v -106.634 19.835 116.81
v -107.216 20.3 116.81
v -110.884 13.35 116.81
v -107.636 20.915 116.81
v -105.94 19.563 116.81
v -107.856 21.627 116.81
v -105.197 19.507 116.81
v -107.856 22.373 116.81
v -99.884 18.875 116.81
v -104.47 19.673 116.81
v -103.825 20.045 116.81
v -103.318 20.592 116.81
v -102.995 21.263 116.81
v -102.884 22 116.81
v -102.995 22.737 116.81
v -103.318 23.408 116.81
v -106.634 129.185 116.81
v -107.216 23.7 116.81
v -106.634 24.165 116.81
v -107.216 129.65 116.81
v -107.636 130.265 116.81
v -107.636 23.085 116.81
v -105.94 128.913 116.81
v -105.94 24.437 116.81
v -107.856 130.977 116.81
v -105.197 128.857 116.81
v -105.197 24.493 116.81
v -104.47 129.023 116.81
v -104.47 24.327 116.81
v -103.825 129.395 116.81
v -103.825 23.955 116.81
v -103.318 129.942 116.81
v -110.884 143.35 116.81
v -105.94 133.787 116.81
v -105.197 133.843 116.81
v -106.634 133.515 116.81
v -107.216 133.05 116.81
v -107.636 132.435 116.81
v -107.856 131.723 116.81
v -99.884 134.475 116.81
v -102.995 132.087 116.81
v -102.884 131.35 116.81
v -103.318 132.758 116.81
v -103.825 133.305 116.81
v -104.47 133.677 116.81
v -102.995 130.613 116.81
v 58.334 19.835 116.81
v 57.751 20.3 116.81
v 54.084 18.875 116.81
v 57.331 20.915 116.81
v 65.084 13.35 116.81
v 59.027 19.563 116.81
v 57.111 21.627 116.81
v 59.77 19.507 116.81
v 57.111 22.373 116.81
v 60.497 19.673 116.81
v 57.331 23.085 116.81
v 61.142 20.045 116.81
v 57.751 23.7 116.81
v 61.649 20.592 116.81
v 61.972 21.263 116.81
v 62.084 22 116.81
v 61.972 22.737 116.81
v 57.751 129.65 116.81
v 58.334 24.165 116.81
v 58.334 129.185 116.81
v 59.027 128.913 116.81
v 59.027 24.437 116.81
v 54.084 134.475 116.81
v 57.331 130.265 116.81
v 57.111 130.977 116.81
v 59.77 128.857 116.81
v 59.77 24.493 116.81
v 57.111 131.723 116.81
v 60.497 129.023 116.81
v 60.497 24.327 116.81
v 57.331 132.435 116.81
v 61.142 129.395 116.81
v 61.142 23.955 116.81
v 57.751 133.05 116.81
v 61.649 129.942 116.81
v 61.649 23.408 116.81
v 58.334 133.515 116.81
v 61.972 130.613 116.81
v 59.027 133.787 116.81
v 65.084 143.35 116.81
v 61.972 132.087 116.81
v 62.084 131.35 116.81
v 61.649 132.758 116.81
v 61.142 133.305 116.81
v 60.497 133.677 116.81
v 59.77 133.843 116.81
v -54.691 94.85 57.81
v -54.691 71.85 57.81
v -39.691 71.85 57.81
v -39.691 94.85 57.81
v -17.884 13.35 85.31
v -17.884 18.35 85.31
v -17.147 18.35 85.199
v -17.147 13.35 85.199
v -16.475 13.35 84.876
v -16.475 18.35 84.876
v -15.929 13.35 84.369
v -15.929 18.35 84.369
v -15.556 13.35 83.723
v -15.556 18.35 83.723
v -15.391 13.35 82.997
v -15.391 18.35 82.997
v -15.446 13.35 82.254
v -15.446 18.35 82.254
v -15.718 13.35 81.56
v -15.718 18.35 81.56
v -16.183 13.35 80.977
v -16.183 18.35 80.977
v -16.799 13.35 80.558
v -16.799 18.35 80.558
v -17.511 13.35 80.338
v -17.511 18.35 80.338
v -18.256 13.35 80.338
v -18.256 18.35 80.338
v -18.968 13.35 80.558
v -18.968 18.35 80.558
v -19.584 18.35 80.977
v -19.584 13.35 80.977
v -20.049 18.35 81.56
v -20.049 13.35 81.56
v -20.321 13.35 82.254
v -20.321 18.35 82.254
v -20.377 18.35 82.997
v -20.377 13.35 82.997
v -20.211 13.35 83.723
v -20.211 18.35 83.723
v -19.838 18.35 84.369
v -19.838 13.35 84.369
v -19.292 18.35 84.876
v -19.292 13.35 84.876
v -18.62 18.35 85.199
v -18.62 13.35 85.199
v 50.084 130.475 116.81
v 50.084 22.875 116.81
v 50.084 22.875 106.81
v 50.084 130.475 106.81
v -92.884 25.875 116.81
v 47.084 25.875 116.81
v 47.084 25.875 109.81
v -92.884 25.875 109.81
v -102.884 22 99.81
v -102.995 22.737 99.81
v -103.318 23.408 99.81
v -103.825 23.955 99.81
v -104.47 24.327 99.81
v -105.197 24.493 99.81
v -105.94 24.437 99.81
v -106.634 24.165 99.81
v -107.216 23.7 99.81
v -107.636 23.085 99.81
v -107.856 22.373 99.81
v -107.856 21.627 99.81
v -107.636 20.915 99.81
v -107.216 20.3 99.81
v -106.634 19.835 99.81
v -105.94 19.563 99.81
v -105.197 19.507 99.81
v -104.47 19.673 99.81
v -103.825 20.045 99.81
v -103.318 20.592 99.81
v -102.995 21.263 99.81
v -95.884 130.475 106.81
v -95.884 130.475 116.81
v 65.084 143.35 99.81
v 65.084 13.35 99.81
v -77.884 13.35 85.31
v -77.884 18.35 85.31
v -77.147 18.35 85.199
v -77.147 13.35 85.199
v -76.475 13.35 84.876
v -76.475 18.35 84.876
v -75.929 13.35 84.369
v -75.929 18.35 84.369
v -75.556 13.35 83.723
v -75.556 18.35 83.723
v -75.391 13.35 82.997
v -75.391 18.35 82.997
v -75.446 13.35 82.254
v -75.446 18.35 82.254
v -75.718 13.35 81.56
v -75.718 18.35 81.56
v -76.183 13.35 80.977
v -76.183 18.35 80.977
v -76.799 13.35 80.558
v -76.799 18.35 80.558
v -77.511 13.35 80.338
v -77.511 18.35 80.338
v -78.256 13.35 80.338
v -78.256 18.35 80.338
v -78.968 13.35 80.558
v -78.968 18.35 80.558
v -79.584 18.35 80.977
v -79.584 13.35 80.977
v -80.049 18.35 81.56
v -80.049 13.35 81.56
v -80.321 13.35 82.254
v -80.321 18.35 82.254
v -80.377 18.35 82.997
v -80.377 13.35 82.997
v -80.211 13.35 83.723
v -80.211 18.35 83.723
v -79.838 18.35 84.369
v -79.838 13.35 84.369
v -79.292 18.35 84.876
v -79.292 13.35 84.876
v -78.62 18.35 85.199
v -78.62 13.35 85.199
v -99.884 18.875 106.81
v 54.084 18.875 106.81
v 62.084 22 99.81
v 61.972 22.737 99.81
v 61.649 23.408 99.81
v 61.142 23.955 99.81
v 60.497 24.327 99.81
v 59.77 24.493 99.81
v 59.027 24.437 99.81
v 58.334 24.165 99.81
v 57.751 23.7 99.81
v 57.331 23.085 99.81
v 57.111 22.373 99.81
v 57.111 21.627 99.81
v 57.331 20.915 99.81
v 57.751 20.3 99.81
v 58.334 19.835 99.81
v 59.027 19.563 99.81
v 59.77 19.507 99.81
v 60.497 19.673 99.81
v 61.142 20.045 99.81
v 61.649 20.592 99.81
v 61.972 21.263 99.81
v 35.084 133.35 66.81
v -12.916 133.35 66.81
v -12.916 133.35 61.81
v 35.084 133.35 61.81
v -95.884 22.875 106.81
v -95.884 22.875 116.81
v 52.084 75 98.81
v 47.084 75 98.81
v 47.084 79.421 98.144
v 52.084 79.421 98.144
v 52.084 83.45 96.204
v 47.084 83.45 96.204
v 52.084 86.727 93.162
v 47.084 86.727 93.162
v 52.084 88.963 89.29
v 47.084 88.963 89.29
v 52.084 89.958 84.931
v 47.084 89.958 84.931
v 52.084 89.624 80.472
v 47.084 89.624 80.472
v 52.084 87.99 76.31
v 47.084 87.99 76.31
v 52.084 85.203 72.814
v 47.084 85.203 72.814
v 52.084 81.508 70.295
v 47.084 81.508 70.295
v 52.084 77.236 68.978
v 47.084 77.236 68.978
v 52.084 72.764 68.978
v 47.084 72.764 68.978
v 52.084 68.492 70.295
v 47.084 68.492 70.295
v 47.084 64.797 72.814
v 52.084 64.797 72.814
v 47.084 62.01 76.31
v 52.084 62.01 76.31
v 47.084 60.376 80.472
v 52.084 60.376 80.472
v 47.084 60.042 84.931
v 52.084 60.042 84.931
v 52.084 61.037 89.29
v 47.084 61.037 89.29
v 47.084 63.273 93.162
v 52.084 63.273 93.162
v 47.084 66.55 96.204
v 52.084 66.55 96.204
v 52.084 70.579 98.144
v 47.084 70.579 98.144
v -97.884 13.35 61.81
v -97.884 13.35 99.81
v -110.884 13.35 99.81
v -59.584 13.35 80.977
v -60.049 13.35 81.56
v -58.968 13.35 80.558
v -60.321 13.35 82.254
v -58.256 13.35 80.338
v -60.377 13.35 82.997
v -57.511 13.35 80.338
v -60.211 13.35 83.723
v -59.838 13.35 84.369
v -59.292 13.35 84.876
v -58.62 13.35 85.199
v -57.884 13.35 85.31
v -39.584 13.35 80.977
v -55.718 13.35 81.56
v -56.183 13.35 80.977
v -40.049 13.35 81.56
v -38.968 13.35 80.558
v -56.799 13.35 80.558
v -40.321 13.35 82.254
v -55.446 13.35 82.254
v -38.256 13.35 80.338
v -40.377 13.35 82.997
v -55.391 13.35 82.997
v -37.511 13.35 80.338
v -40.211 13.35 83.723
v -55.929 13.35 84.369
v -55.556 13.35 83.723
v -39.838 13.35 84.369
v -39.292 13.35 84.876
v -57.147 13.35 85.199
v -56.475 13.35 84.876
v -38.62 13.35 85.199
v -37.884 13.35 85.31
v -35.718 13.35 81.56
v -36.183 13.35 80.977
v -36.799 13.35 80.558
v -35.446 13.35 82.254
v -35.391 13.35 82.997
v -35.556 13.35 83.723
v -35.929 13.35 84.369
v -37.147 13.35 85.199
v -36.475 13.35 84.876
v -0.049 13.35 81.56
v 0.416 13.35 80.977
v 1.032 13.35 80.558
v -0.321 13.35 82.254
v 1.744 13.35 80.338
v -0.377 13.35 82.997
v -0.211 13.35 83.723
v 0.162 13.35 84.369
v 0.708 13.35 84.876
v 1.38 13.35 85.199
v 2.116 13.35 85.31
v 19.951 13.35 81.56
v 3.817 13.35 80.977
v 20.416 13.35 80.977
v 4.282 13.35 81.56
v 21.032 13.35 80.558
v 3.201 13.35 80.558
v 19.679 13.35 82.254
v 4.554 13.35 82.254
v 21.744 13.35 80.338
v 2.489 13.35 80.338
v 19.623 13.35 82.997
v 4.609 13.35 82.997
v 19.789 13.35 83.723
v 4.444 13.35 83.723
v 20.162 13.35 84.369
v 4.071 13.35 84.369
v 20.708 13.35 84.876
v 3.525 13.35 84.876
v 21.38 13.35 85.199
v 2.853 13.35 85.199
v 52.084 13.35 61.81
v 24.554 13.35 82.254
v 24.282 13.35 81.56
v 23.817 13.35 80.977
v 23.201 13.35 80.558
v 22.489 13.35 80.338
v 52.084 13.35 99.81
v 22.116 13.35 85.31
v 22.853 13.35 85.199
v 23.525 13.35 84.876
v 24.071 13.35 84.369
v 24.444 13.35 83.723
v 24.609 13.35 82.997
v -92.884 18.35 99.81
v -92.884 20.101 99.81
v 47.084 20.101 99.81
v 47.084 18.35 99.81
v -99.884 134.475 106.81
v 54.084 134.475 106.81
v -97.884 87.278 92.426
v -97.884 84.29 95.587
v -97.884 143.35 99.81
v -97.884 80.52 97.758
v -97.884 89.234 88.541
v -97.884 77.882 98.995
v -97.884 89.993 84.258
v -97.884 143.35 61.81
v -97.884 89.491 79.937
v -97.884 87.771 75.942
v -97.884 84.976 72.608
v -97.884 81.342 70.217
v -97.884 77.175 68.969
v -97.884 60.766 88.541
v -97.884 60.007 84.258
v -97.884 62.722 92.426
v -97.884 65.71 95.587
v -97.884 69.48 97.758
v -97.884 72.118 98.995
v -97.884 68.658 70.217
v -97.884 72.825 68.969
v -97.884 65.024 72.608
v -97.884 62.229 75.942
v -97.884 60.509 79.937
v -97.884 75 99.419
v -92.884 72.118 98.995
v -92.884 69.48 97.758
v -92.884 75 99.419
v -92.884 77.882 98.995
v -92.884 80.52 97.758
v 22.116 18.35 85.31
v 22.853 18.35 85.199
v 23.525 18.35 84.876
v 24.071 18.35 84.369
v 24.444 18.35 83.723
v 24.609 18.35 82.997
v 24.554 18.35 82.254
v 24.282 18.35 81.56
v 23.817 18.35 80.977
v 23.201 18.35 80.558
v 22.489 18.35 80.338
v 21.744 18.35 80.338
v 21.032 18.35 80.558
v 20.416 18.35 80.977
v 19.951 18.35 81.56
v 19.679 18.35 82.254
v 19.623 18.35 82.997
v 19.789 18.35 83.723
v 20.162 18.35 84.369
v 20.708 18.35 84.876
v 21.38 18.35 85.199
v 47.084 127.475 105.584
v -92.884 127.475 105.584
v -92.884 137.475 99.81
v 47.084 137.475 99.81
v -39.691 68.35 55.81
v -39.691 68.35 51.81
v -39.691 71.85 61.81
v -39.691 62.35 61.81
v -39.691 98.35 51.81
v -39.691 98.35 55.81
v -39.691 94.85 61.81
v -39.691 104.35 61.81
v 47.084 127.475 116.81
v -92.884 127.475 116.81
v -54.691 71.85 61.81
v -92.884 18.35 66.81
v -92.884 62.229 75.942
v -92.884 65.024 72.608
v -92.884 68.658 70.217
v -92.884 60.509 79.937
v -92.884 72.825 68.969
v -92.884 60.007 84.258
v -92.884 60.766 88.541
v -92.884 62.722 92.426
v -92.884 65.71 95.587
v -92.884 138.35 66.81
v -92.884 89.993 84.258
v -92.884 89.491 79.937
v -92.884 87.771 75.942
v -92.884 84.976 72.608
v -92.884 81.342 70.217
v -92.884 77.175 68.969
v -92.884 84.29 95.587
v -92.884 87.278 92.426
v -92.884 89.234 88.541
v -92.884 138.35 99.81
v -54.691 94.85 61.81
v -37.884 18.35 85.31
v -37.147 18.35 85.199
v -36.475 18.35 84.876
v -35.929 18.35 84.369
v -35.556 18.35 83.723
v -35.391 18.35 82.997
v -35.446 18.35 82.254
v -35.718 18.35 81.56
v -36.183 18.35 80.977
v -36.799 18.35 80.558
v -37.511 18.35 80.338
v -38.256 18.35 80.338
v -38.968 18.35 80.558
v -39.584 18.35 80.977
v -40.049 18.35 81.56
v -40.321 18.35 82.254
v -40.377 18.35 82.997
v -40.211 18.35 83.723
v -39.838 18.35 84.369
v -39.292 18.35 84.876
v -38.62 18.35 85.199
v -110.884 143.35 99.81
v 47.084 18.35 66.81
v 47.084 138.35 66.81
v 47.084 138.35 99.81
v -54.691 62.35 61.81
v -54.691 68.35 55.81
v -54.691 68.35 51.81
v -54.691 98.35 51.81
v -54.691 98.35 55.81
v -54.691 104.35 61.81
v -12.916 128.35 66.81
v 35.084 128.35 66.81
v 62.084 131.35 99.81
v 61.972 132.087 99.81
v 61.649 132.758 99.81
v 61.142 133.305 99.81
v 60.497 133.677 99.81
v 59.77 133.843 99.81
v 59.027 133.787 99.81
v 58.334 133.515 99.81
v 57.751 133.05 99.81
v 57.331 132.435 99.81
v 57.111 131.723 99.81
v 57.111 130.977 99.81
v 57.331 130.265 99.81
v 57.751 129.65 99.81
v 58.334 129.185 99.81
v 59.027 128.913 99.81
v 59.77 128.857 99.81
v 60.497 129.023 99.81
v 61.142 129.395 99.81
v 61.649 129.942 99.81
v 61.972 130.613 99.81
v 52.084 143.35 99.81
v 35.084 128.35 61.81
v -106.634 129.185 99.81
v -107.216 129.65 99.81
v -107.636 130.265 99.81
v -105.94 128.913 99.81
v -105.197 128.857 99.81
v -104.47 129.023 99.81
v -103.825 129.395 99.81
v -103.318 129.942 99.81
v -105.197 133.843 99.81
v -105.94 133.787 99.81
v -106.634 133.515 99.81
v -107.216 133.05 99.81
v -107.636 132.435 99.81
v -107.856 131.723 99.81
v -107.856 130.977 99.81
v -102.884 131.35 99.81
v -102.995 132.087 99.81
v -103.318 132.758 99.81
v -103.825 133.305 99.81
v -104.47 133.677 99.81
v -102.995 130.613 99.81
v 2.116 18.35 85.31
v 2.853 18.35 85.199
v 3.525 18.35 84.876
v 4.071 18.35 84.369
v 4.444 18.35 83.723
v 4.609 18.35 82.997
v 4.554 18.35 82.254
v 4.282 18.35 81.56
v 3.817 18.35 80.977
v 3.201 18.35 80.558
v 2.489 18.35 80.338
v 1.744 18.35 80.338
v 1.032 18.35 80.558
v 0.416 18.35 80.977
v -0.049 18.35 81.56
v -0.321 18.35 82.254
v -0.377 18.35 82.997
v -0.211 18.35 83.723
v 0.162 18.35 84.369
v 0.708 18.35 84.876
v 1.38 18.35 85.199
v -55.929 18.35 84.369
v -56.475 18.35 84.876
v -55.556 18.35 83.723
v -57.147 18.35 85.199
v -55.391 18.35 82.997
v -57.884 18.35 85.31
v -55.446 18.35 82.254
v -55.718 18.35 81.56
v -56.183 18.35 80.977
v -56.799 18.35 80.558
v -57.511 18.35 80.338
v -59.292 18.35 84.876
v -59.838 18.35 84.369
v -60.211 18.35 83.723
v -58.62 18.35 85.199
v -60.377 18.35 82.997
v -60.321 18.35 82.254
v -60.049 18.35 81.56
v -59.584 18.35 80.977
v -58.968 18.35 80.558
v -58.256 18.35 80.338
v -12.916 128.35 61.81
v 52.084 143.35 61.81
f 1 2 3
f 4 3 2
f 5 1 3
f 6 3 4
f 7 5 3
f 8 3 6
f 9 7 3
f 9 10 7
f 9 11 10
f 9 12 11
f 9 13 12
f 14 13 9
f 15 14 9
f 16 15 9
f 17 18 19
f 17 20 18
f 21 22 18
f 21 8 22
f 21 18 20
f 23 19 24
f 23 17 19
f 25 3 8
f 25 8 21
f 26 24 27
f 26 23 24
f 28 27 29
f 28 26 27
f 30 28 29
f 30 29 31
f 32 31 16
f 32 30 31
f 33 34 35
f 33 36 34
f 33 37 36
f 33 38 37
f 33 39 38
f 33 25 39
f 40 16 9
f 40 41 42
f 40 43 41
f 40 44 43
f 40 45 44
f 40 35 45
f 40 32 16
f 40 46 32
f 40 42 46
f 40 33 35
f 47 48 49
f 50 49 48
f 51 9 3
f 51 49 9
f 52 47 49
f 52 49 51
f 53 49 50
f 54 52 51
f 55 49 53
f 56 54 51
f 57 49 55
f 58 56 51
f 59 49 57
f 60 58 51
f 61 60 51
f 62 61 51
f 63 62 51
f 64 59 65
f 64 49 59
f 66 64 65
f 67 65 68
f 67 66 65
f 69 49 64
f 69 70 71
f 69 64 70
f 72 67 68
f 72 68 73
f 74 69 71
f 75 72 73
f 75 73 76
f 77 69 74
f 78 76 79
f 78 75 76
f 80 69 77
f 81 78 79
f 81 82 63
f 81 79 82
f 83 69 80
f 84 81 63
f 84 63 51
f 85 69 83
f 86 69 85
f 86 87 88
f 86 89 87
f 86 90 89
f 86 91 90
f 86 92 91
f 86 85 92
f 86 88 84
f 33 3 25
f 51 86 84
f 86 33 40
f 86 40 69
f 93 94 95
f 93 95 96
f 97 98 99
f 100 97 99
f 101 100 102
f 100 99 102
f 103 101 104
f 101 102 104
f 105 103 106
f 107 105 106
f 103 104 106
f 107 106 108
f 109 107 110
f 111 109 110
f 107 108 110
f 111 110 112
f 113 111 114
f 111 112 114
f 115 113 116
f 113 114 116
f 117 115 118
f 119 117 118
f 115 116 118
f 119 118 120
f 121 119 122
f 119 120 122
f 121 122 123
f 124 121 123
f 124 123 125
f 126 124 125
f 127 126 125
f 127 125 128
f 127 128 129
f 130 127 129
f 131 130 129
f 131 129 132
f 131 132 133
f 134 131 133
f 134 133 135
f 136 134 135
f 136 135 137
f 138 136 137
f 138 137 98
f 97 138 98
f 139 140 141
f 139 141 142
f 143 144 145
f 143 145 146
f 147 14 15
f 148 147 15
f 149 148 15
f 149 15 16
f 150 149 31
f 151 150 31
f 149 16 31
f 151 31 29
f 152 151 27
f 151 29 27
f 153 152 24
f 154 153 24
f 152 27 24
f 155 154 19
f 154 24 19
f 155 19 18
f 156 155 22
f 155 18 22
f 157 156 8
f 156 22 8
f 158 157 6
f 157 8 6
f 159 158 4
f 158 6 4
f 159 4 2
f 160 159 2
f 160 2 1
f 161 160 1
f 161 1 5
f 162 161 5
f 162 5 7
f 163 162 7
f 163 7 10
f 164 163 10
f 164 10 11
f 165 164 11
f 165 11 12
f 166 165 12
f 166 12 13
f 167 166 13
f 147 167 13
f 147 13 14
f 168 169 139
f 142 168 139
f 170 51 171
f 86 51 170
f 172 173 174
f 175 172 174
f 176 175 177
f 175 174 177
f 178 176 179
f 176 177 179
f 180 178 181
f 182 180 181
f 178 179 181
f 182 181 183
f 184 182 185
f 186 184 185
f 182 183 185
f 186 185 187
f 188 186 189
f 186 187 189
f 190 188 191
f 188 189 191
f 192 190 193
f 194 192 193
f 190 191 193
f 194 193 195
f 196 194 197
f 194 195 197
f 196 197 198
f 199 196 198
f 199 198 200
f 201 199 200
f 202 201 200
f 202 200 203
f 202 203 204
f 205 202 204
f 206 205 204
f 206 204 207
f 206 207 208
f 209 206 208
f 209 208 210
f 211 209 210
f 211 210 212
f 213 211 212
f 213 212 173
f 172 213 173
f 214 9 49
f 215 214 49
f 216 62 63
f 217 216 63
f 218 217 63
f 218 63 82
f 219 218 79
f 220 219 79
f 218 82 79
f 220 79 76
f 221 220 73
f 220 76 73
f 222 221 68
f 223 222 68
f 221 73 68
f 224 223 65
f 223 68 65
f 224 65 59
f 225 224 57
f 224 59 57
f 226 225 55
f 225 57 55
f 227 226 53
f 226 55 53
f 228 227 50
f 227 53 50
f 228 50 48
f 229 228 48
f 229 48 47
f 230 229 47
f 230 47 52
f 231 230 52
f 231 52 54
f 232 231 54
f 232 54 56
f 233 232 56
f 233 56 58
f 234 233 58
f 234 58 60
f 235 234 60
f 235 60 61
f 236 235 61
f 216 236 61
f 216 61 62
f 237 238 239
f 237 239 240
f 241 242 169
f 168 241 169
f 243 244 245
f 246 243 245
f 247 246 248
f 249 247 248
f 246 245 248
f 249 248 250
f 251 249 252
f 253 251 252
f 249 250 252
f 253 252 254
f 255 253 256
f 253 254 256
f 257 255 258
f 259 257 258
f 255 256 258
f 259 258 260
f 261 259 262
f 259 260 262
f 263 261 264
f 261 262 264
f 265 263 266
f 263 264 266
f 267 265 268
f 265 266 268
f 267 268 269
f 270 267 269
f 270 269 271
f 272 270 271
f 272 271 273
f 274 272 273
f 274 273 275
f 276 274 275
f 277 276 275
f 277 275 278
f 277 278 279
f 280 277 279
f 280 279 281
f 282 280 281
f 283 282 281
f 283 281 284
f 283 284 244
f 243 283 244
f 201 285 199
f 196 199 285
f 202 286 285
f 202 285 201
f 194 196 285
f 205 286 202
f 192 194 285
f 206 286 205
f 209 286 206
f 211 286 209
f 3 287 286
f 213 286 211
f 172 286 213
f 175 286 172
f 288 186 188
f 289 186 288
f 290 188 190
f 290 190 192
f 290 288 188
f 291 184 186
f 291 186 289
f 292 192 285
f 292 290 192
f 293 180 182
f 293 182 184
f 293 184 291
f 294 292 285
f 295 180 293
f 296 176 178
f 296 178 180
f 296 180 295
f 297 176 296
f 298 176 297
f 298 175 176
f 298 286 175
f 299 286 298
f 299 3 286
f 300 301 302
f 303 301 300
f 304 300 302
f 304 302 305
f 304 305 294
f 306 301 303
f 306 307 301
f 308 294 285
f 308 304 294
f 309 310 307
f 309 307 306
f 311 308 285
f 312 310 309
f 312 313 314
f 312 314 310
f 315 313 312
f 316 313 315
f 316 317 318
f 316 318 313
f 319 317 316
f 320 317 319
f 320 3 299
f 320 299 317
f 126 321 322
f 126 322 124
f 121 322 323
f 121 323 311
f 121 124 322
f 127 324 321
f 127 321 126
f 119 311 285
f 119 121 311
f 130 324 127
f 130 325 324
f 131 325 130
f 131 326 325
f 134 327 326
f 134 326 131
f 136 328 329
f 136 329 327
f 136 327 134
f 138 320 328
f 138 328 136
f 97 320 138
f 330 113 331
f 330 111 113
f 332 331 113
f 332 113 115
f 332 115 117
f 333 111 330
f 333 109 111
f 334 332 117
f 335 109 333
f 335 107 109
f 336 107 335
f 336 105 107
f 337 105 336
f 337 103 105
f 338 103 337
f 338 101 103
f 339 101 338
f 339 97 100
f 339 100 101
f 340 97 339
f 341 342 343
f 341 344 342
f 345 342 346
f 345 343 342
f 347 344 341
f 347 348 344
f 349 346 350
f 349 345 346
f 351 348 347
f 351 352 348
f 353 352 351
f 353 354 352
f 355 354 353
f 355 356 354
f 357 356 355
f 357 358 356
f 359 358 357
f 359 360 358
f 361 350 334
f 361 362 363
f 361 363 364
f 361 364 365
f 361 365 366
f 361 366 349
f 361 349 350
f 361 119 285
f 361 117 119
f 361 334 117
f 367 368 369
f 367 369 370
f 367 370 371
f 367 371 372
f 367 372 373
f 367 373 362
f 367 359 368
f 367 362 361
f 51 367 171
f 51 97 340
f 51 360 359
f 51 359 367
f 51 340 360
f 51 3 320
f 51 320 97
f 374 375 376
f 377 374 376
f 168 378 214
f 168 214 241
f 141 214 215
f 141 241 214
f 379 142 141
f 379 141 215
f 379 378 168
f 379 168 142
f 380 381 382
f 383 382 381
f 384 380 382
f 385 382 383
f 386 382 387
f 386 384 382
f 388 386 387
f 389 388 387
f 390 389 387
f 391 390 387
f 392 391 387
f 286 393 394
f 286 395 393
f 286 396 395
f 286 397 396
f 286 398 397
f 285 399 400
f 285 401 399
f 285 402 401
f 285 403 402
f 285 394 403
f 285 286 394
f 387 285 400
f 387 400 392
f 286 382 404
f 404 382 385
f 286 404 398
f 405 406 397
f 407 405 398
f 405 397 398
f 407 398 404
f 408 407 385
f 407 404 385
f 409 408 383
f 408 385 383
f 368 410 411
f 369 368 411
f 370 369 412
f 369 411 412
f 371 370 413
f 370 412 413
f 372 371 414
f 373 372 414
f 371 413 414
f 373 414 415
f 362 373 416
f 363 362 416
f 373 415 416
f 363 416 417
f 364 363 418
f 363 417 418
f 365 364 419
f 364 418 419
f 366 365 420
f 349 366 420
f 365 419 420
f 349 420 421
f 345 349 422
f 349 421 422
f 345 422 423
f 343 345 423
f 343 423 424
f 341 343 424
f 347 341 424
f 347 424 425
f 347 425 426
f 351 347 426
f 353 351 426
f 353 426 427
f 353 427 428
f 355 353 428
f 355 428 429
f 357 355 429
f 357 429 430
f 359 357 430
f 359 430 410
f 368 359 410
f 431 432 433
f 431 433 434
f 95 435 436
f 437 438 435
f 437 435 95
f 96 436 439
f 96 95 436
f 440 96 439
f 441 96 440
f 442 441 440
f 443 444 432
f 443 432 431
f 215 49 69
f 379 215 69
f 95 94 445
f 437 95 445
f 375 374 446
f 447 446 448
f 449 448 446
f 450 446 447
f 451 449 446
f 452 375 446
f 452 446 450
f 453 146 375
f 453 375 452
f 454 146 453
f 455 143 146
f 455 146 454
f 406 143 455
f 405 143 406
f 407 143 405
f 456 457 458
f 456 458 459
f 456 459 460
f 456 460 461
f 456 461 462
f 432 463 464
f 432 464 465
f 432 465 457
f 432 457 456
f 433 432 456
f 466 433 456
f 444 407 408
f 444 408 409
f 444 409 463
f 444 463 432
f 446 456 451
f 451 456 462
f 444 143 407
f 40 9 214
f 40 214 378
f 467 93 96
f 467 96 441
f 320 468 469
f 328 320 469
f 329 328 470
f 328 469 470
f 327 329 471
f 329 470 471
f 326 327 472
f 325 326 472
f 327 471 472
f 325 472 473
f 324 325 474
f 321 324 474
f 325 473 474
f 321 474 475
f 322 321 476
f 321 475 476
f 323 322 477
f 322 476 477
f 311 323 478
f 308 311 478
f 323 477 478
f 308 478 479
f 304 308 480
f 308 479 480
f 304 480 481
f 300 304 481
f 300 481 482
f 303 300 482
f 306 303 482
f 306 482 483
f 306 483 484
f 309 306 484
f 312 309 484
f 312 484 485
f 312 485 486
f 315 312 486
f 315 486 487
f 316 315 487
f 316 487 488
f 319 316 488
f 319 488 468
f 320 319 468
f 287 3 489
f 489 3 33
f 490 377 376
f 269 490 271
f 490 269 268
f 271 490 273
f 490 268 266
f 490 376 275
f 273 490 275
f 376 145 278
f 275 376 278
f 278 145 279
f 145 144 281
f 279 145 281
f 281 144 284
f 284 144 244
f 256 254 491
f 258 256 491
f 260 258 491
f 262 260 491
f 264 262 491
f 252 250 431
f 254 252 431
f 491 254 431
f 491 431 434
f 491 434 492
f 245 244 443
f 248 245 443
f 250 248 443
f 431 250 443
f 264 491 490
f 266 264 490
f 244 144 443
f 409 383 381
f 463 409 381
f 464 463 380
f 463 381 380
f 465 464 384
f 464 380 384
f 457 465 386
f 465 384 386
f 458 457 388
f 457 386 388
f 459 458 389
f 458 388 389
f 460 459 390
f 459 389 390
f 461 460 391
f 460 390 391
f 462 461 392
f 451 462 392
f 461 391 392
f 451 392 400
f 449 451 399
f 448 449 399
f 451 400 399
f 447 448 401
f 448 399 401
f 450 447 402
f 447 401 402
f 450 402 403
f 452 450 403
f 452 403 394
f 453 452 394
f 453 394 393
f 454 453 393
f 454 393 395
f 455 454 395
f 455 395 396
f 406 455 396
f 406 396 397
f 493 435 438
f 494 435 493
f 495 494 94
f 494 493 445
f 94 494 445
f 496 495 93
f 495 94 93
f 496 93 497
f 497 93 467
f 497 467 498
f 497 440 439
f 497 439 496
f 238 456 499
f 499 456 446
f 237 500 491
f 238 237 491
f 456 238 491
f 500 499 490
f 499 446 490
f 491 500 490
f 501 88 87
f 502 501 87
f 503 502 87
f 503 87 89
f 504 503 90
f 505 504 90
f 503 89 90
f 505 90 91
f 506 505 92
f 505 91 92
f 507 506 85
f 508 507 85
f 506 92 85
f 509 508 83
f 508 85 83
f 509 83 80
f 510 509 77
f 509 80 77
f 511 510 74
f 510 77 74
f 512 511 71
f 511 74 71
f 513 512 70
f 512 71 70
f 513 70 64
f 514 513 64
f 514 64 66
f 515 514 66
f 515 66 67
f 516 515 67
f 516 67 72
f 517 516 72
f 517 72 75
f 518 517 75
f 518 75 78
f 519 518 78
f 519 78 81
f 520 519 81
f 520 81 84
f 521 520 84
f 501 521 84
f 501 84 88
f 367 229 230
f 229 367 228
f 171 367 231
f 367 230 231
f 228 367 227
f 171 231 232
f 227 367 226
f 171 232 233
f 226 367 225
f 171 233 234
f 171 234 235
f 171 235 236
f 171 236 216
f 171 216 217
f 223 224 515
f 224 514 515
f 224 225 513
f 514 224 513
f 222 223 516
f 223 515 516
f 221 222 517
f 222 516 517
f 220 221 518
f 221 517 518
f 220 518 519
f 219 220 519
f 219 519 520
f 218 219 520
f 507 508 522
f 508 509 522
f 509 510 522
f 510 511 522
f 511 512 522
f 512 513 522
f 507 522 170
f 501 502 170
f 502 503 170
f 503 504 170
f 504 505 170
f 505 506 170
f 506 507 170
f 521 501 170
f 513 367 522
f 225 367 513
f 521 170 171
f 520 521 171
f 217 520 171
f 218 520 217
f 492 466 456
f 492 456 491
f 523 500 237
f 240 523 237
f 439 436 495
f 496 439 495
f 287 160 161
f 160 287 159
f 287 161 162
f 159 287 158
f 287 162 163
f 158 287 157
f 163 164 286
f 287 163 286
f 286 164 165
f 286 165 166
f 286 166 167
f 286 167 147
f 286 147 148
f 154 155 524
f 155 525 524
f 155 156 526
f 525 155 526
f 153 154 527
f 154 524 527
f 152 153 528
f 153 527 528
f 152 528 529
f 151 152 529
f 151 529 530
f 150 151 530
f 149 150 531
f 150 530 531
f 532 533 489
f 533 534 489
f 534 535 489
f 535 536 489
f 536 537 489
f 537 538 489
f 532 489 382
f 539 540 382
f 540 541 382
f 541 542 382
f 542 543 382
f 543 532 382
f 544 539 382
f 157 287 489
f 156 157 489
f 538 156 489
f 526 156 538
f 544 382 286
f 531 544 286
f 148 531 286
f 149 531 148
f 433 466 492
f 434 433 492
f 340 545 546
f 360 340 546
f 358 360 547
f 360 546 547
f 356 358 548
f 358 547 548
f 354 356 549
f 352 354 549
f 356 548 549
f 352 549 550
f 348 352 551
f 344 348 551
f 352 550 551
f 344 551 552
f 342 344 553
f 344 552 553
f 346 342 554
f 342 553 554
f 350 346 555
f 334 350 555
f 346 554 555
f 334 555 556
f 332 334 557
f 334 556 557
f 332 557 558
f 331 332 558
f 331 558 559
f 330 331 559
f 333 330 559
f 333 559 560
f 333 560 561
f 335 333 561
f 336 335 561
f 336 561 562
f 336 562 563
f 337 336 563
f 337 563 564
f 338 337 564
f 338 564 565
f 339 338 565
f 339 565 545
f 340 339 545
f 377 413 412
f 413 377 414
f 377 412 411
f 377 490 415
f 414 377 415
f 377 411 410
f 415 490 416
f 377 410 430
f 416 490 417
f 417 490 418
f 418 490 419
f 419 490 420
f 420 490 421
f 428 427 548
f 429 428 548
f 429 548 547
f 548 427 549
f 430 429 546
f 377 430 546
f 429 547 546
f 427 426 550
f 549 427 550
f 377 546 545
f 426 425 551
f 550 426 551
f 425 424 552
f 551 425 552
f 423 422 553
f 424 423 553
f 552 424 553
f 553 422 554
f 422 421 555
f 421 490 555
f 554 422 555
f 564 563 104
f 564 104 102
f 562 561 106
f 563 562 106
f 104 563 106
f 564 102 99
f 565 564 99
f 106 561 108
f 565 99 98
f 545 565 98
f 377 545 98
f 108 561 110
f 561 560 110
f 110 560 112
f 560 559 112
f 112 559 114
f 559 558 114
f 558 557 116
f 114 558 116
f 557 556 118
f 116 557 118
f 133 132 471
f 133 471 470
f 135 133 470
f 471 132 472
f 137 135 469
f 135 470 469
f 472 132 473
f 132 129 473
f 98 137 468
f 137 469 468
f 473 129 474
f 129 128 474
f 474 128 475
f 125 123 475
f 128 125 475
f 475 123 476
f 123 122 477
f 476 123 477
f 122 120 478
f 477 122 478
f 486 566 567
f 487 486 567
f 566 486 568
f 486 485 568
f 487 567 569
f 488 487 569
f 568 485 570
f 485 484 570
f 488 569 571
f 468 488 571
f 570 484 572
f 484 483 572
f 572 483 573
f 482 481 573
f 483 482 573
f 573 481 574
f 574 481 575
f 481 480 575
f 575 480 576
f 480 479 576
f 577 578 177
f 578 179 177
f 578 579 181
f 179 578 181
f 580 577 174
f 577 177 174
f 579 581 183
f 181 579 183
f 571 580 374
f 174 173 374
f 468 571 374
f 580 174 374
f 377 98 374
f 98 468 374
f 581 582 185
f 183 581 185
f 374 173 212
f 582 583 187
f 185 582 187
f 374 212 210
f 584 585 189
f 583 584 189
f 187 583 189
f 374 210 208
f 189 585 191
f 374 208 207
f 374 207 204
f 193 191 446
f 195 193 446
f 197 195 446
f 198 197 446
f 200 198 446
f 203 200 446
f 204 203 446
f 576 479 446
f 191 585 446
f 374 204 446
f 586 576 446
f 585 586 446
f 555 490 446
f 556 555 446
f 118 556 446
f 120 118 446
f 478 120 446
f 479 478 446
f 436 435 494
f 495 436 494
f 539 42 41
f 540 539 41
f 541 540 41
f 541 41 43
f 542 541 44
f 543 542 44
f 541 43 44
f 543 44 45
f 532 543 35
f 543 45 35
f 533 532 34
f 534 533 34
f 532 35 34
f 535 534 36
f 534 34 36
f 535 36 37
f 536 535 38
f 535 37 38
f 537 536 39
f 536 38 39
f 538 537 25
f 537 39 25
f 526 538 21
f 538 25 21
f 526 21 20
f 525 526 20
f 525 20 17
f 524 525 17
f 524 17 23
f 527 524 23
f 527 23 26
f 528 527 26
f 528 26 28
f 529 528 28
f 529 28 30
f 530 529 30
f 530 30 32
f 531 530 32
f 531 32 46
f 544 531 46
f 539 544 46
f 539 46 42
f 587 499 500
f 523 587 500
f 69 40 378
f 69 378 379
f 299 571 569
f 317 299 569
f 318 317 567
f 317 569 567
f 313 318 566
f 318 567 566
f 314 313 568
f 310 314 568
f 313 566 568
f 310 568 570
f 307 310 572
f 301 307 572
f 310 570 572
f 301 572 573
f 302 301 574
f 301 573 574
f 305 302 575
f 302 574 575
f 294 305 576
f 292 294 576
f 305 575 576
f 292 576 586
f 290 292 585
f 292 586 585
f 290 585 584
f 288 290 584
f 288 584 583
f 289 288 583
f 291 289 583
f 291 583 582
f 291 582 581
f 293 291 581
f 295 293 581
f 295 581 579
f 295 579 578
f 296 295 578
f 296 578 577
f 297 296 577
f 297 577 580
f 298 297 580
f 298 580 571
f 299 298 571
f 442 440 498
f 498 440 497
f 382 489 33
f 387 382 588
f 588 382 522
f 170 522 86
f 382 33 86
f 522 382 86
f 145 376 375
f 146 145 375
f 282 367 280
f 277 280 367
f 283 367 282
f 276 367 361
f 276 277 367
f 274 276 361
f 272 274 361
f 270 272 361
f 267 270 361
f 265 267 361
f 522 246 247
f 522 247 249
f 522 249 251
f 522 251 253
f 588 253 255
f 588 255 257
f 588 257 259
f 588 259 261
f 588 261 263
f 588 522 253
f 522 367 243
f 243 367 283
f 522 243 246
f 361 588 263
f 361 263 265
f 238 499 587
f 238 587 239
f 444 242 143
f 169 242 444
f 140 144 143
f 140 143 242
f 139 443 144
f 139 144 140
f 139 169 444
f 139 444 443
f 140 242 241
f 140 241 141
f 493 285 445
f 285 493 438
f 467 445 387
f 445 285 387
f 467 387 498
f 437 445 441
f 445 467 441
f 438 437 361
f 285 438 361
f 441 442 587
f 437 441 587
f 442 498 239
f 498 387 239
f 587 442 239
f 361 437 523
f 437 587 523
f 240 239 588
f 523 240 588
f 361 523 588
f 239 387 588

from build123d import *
from OCP.BRepFilletAPI import BRepFilletAPI_MakeChamfer

# Parameters (mm, degrees)
SKETCH1_R               = 172.5
BOSS_EXTRUDE1_DEPTH     = 10
SKETCH2_R               = 48.41
CUT_EXTRUDE1_DEPTH      = 10
BOSS_EXTRUDE2_DEPTH     = 5
CUT_EXTRUDE2_DEPTH      = 497
CUT_EXTRUDE6_START      = -497
CUT_EXTRUDE6_DEPTH      = 497
SKETCH6_W               = 195.767044214
SKETCH6_H               = 55
SKETCH6_W_2             = 185.767044214
SKETCH6_H_2             = 45
BOSS_EXTRUDE3_DEPTH     = 133.35
SKETCH7_W               = 185.767044214
SKETCH7_H               = 45
BOSS_EXTRUDE4_DEPTH     = 5
BOSS_EXTRUDE5_DEPTH     = 8
CHAMFER1_SIZE           = 8
CHAMFER1_SIZE2          = 6.250285012
CHAMFER1_PART_2_SIZE    = 8
CHAMFER1_PART_2_SIZE2   = 6.250285012
CHAMFER1_PART_3_SIZE    = 8
CHAMFER1_PART_3_SIZE2   = 6.250285012
FILLET1_R               = 38
SKETCH9_R               = 374.079334695
CUT_EXTRUDE7_DEPTH      = 93
CUT_EXTRUDE8_DEPTH      = 93
CUT_EXTRUDE8_DEPTH_BACK = 93
SKETCH10_R              = 229.38613092
SKETCH10_R_2            = 152.4
SKETCH11_W              = 291.443368419
SKETCH11_H              = 134.798764099
SKETCH11_W_2            = 144.967044214
SKETCH11_H_2            = 55
CUT_EXTRUDE9_DEPTH      = 143
SKETCH12_W              = 5
SKETCH12_H              = 55
BOSS_EXTRUDE6_DEPTH     = 133.35
SKETCH13_R              = 10
CUT_EXTRUDE10_DEPTH     = 58
SKETCH14_W              = 139.967044214
SKETCH14_H              = 45
BOSS_EXTRUDE7_DEPTH     = 5
SKETCH15_W              = 139.967044214
SKETCH15_H              = 123.35
CUT_EXTRUDE11_DEPTH     = 13
SKETCH16_W              = 10
SKETCH16_H              = 133.35
SKETCH16_W_2            = 149.967044214
BOSS_EXTRUDE9_DEPTH     = 17
SKETCH17_W              = 153.967044214
SKETCH17_H              = 115.6
SKETCH17_W_2            = 145.967044214
SKETCH17_H_2            = 107.6
CUT_EXTRUDE12_DEPTH     = 10
CHAMFER2_SIZE           = 10
CHAMFER2_SIZE2          = 5.773502692
SKETCH24_R              = 15
CUT_EXTRUDE16_DEPTH     = 177.5
SKETCH20_W              = 169.967044214
SKETCH20_H              = 3.35
CUT_EXTRUDE17_DEPTH     = 177.5
SKETCH25_W              = 139.967044214
SKETCH25_H              = 38.773502692
BOSS_EXTRUDE11_DEPTH    = 5
SKETCH26_W              = 3
SKETCH26_H              = 130
BOSS_EXTRUDE12_DEPTH    = 17
SKETCH18_R              = 2.5
CUT_EXTRUDE19_DEPTH     = 26
SKETCH27_W              = 48
SKETCH27_H              = 5
CUT_EXTRUDE20_DEPTH     = 23
SKETCH28_R              = 2.5
CUT_EXTRUDE21_DEPTH     = 10
SKETCH29_W              = 15
SKETCH29_H              = 30
BOSS_EXTRUDE13_DEPTH    = 10
SKETCH30_W              = 4
SKETCH30_H              = 23
CUT_EXTRUDE22_DEPTH     = 21
CHAMFER3_SIZE           = 6


with BuildPart() as part:
    # Sketch1 → Boss-Extrude1 (new body)
    with BuildSketch(Plane(origin=(0, 0, 0), x_dir=(1, 0, 0), z_dir=(0, 1, 0))):
        with Locations(Location((0, 0, 0), (0, 0, 270))):
            Circle(SKETCH1_R)
    extrude(amount=BOSS_EXTRUDE1_DEPTH)

    # Sketch2 → Cut-Extrude1 (cut)
    with BuildSketch(Plane(origin=(0, 10, 0), x_dir=(1, 0, 0), z_dir=(0, 1, 0))):
        with Locations((-75.91, -178.72)):
            Circle(SKETCH2_R)
        with Locations((75.91, -178.72)):
            Circle(SKETCH2_R)
    extrude(amount=-CUT_EXTRUDE1_DEPTH, mode=Mode.SUBTRACT)

    # Sketch3 → Boss-Extrude2 (add)
    with BuildSketch(Plane(origin=(0, 10, 0), x_dir=(1, 0, 0), z_dir=(0, 1, 0))):
        with BuildLine():
            Line((-98.968297449, -119.81), (98.968297449, -119.81))
            ThreePointArc((98.968297449, -119.81), (0, 155.4), (-98.968297449, -119.81))
        make_face()
        with BuildLine():
            ThreePointArc((97.883522107, -116.81), (0, 152.4), (-97.883522107, -116.81))
            Line((-97.883522107, -116.81), (97.883522107, -116.81))
        make_face(mode=Mode.SUBTRACT)
    extrude(amount=BOSS_EXTRUDE2_DEPTH)

    # Sketch4 → Cut-Extrude2 (cut)
    with BuildSketch(Plane(origin=(0, 10, 0), x_dir=(1, 0, 0), z_dir=(0, 1, 0))):
        Polygon((-28.261160255, -170.169200565), (28.261160255, -170.169200565), (28.261160255, -183.836149753), (-30.300470404, -183.836149753), align=None)
    extrude(amount=-CUT_EXTRUDE2_DEPTH, mode=Mode.SUBTRACT)

    # Sketch5 → Cut-Extrude6 (cut)
    with BuildSketch(Plane(origin=(0, 10, 0), x_dir=(1, 0, 0), z_dir=(0, 1, 0)).offset(CUT_EXTRUDE6_START)):
        with BuildLine():
            ThreePointArc((26.702080818, 170.420799435), (0, 172.5), (-26.702080818, 170.420799435))
            Line((-26.702080818, 170.420799435), (26.702080818, 170.420799435))
        make_face()
        with BuildLine():
            ThreePointArc((166.525, -45.007492432), (172.5, 0), (166.525, 45.007492432))
            Line((166.525, 45.007492432), (166.525, -45.007492432))
        make_face()
        with BuildLine():
            Line((-166.525, -45.007492432), (-166.525, 45.007492432))
            ThreePointArc((-166.525, 45.007492432), (-172.5, 0), (-166.525, -45.007492432))
        make_face()
    extrude(amount=CUT_EXTRUDE6_DEPTH, mode=Mode.SUBTRACT)

    # Sketch6 → Boss-Extrude3 (add)
    with BuildSketch(Plane(origin=(0, 10, 0), x_dir=(1, 0, 0), z_dir=(0, 1, 0))):
        with Locations((0, -89.31)):
            Rectangle(SKETCH6_W, SKETCH6_H)
        with Locations((0, -89.31)):
            Rectangle(SKETCH6_W_2, SKETCH6_H_2, mode=Mode.SUBTRACT)
    extrude(amount=BOSS_EXTRUDE3_DEPTH)

    # Sketch7 → Boss-Extrude4 (add)
    with BuildSketch(Plane(origin=(0, 10, 0), x_dir=(1, 0, 0), z_dir=(0, 1, 0))):
        with Locations((0, -89.31)):
            Rectangle(SKETCH7_W, SKETCH7_H)
    extrude(amount=BOSS_EXTRUDE4_DEPTH)

    # Sketch8 → Boss-Extrude5 (add)
    with BuildSketch(Plane(origin=(0, 10, 0), x_dir=(1, 0, 0), z_dir=(0, 1, 0))):
        with BuildLine():
            Line((-97.883522107, -61.81), (-112.883522107, -61.81))
            Line((-112.883522107, -61.81), (-112.883522107, -101.267136509))
            ThreePointArc((-112.883522107, -101.267136509), (-105.634768892, -108.807252061), (-97.883522107, -115.829782871))
            Line((-97.883522107, -115.829782871), (-97.883522107, -61.81))
        make_face()
        with BuildLine():
            Line((-88.028513968, -46.81), (-88.028513968, -61.81))
            Line((-88.028513968, -61.81), (97.883522107, -61.81))
            Line((97.883522107, -61.81), (97.883522107, -115.829782871))
            ThreePointArc((97.883522107, -115.829782871), (105.634768892, -108.807252061), (112.883522107, -101.267136509))
            Line((112.883522107, -101.267136509), (112.883522107, -46.81))
            Line((112.883522107, -46.81), (-88.028513968, -46.81))
        make_face()
    extrude(amount=BOSS_EXTRUDE5_DEPTH)

    # Chamfer1
    chamfer1_edges = [part.edges().sort_by_distance(p)[0] for p in [
        (-97.883522107, 18, 88.819891436),
    ]]
    chamfer1_side = [part.faces().sort_by_distance(p)[0] for p in [
        (-97.883522107, 80.599247918, 89.340686997),
    ]]
    chamfer(chamfer1_edges, length=CHAMFER1_SIZE, length2=CHAMFER1_SIZE2, reference=chamfer1_side[0])

    # Chamfer1 part 2
    chamfer1_part_2_edges = [part.edges().sort_by_distance(p)[0] for p in [
        (4.927504069, 18, 61.81),
    ]]
    chamfer1_part_2_side = [part.faces().sort_by_distance(p)[0] for p in [
        (-0.807441513, 80.139082253, 61.81),
    ]]
    chamfer(chamfer1_part_2_edges, length=CHAMFER1_PART_2_SIZE, length2=CHAMFER1_PART_2_SIZE2, reference=chamfer1_part_2_side[0])

    # Chamfer1 part 3
    chamfer1_part_3_edges = [part.edges().sort_by_distance(p)[0] for p in [
        (97.883522107, 18, 88.819891436),
    ]]
    chamfer1_part_3_side = [part.faces().sort_by_distance(p)[0] for p in [
        (97.883522107, 80.599247918, 89.340686997),
    ]]
    chamfer(chamfer1_part_3_edges, length=CHAMFER1_PART_3_SIZE, length2=CHAMFER1_PART_3_SIZE2, reference=chamfer1_part_3_side[0])

    # Fillet1
    # the kernel refuses this fillet: 38 mm, written as the material it adds along each edge
    with BuildSketch(Plane(origin=(-97.883522107, 26, 148.028657271), x_dir=(-0.61566147532566, -0.7880107536067207, 0), z_dir=(0, 0, -1))) as fillet1_piece_1_section:
        with BuildLine():
            CenterArc((13.24591235, 37.873851244), FILLET1_R, 232, 33.330100487)
            Line((-10.149223713, 7.929442607), (0, 0))
            Line((0, 0), (10.152145721, 0))
        make_face()
    fillet1_piece_1 = extrude(amount=86.218657271, mode=Mode.PRIVATE)
    fillet1_piece_1 = fillet1_piece_1 & Plane(origin=(0, 26, 0), x_dir=(-0.7443687577094257, 0, 0.6677687867414337), z_dir=(0, -1, 0)) * Cylinder(151.65, 214, mode=Mode.PRIVATE)
    add(fillet1_piece_1)
    with BuildSketch(Plane(origin=(-88.028513968, 26, 61.81), x_dir=(0, 1, 0), z_dir=(1, 0, 0))) as fillet1_piece_2_section:
        with BuildLine():
            CenterArc((12.87954976, -38), FILLET1_R, 90, 33.330100487)
            Line((-8, -6.250285012), (0, 0))
            Line((0, 0), (12.87954976, 0))
        make_face()
    fillet1_piece_2 = extrude(amount=218.110910475, mode=Mode.PRIVATE)
    fillet1_piece_2 = fillet1_piece_2 - Plane(origin=(135.883522107, 38.87954976, 61.81), x_dir=(-0.8355188154722692, -0.5494618357919104, 0), z_dir=(0, 0, -1)) * Cylinder(38, 488, mode=Mode.PRIVATE)
    add(fillet1_piece_2)
    with BuildSketch(Plane(origin=(97.883522107, 26, 29.6111256), x_dir=(0.61566147532566, -0.7880107536067207, 0), z_dir=(0, 0, 1))) as fillet1_piece_3_section:
        with BuildLine():
            CenterArc((13.24591235, 37.873851244), FILLET1_R, 232, 33.330100487)
            Line((-10.149223713, 7.929442607), (0, 0))
            Line((0, 0), (10.152145721, 0))
        make_face()
    fillet1_piece_3 = extrude(amount=118.417531672, mode=Mode.PRIVATE)
    fillet1_piece_3 = fillet1_piece_3 & Plane(origin=(0, 26, 0), x_dir=(0.6454567893612635, 0, 0.7637967878090673), z_dir=(0, -1, 0)) * Cylinder(151.65, 278, mode=Mode.PRIVATE)
    fillet1_piece_3 = fillet1_piece_3 - Plane(origin=(97.883522107, 38.87954976, 23.81), x_dir=(0, 0, 1), z_dir=(-1, 0, 0)) * Cylinder(38, 278, mode=Mode.PRIVATE)
    add(fillet1_piece_3)

    # Sketch9 → Cut-Extrude7 (cut)
    with BuildSketch(Plane(origin=(0, 10, 0), x_dir=(1, 0, 0), z_dir=(0, 1, 0))):
        Circle(SKETCH9_R)
    extrude(amount=-CUT_EXTRUDE7_DEPTH, mode=Mode.SUBTRACT)

    # Sketch10 → Cut-Extrude8 (cut, two sides: drawn at the far end of the back side and taken through both)
    with BuildSketch(Plane.XZ.offset(-10).offset(-CUT_EXTRUDE8_DEPTH_BACK)):
        Circle(SKETCH10_R)
        Circle(SKETCH10_R_2, mode=Mode.SUBTRACT)
    extrude(amount=CUT_EXTRUDE8_DEPTH + CUT_EXTRUDE8_DEPTH_BACK, mode=Mode.SUBTRACT)

    # Sketch11 → Cut-Extrude9 (cut)
    with BuildSketch(Plane(origin=(0, 143.35, 0), x_dir=(1, 0, 0), z_dir=(0, 1, 0))):
        with Locations((4.840839595, -88.771460056)):
            Rectangle(SKETCH11_W, SKETCH11_H)
        with Locations((-25.4, -89.31)):
            Rectangle(SKETCH11_W_2, SKETCH11_H_2, mode=Mode.SUBTRACT)
    extrude(amount=-CUT_EXTRUDE9_DEPTH, mode=Mode.SUBTRACT)

    # Sketch12 → Boss-Extrude6 (add)
    with BuildSketch(Plane(origin=(0, 143.35, 0), x_dir=(1, 0, 0), z_dir=(0, 1, 0))):
        with Locations((49.583522107, -89.31)):
            Rectangle(SKETCH12_W, SKETCH12_H)
    extrude(amount=-BOSS_EXTRUDE6_DEPTH)

    # Sketch13 → Cut-Extrude10 (cut)
    with BuildSketch(Plane.ZY.offset(97.883522107)):
        with Locations((89.418847681, 75)):
            Circle(SKETCH13_R)
    extrude(amount=-CUT_EXTRUDE10_DEPTH, mode=Mode.SUBTRACT)

    # Sketch14 → Boss-Extrude7 (add)
    with BuildSketch(Plane(origin=(0, 143.35, 0), x_dir=(1, 0, 0), z_dir=(0, 1, 0))):
        with Locations((-22.9, -89.31)):
            Rectangle(SKETCH14_W, SKETCH14_H)
    extrude(amount=-BOSS_EXTRUDE7_DEPTH)

    # Sketch15 → Cut-Extrude11 (cut)
    with BuildSketch(Plane.XY.offset(116.81)):
        with Locations((-22.9, 76.675)):
            Rectangle(SKETCH15_W, SKETCH15_H)
    extrude(amount=-CUT_EXTRUDE11_DEPTH, mode=Mode.SUBTRACT)

    # Sketch16 → Boss-Extrude9 (add)
    # profile 1 of 5: a face of its own
    with BuildSketch(Plane.XY.offset(116.81)):
        with Locations((-102.883522107, 76.675)):
            Rectangle(SKETCH16_W, SKETCH16_H)
    # profile 2 of 5: a face of its own
    with BuildSketch(Plane.XY.offset(116.81)):
        with Locations((-22.9, 76.675)):
            Rectangle(SKETCH16_W_2, SKETCH16_H)
        Polygon((-92.883522107, 127.475), (-92.883522107, 138.35), (47.083522107, 138.35), (47.083522107, 127.475), (47.083522107, 76.675), (47.083522107, 25.875), (47.083522107, 15), (-92.883522107, 15), (-92.883522107, 25.875), (-92.883522107, 76.675), align=None, mode=Mode.SUBTRACT)
    # profile 3 of 5: a face of its own
    with BuildSketch(Plane.XY.offset(116.81)):
        with Locations((57.083522107, 76.675)):
            Rectangle(SKETCH16_W, SKETCH16_H)
    # profile 4 of 5: a face of its own
    with BuildSketch(Plane.XY.offset(116.81)):
        Polygon((47.083522107, 138.35), (-92.883522107, 138.35), (-92.883522107, 127.475), (-22.9, 127.475), (47.083522107, 127.475), align=None)
    # profile 5 of 5: a face of its own
    with BuildSketch(Plane.XY.offset(116.81)):
        Polygon((-22.9, 25.875), (-92.883522107, 25.875), (-92.883522107, 15), (47.083522107, 15), (47.083522107, 25.875), align=None)
    extrude(amount=-BOSS_EXTRUDE9_DEPTH)

    # Sketch17 → Cut-Extrude12 (cut)
    with BuildSketch(Plane.XY.offset(116.81)):
        with Locations((-22.9, 76.675)):
            Rectangle(SKETCH17_W, SKETCH17_H)
        with Locations((-22.9, 76.675)):
            Rectangle(SKETCH17_W_2, SKETCH17_H_2, mode=Mode.SUBTRACT)
    extrude(amount=-CUT_EXTRUDE12_DEPTH, mode=Mode.SUBTRACT)

    # Chamfer2: one chamfer whose edges measure the first distance from different faces: ONE call of the kernel's chamfer builder (chamfer() names one face for all edges)
    chamfer2_edges_1 = [part.edges().sort_by_distance(p)[0] for p in [
        (-22.9, 25.875, 99.81),
    ]]
    chamfer2_side_1 = [part.faces().sort_by_distance(p)[0] for p in [
        (-22.9, 25.875, 108.31),
    ]]
    chamfer2_edges_2 = [part.edges().sort_by_distance(p)[0] for p in [
        (-22.9, 127.475, 99.81),
    ]]
    chamfer2_side_2 = [part.faces().sort_by_distance(p)[0] for p in [
        (-22.9, 132.9125, 99.81),
    ]]
    chamfer2 = BRepFilletAPI_MakeChamfer(part.part.solid().wrapped)
    for e in chamfer2_edges_1:
        chamfer2.Add(CHAMFER2_SIZE, CHAMFER2_SIZE2, e.wrapped, chamfer2_side_1[0].wrapped)  # the first distance lies on this face
    for e in chamfer2_edges_2:
        chamfer2.Add(CHAMFER2_SIZE, CHAMFER2_SIZE2, e.wrapped, chamfer2_side_2[0].wrapped)  # the first distance lies on this face
    add(Compound.cast(chamfer2.Shape()), mode=Mode.REPLACE)

    # Sketch24 → Cut-Extrude16 (cut)
    with BuildSketch(Plane.ZY.offset(97.883522107)):
        with Locations((83.81, 75)):
            Circle(SKETCH24_R)
    extrude(amount=-CUT_EXTRUDE16_DEPTH, mode=Mode.SUBTRACT)

    # Sketch20 → Cut-Extrude17 (cut)
    with BuildSketch(Plane.XY.offset(116.81)):
        with Locations((-22.9, 11.675)):
            Rectangle(SKETCH20_W, SKETCH20_H)
    extrude(amount=-CUT_EXTRUDE17_DEPTH, mode=Mode.SUBTRACT)

    # Sketch25 → Boss-Extrude11 (add)
    with BuildSketch(Plane(origin=(0, 13.35, 0), x_dir=(-1, 0, 0), z_dir=(0, -1, 0))):
        with Locations((22.9, -86.196751346)):
            Rectangle(SKETCH25_W, SKETCH25_H)
    extrude(amount=-BOSS_EXTRUDE11_DEPTH)

    # Sketch26 → Boss-Extrude12 (add)
    with BuildSketch(Plane.XY.offset(116.81)):
        with Locations((-109.383522107, 78.35)):
            Rectangle(SKETCH26_W, SKETCH26_H)
        with Locations((63.583522107, 78.35)):
            Rectangle(SKETCH26_W, SKETCH26_H)
    extrude(amount=-BOSS_EXTRUDE12_DEPTH)

    # Sketch18 → Cut-Extrude19 (cut)
    with BuildSketch(Plane.XY.offset(116.81)):
        with Locations((-105.383522107, 22)):
            Circle(SKETCH18_R)
        with Locations((59.583522107, 22)):
            Circle(SKETCH18_R)
        with Locations((59.583522107, 131.35)):
            Circle(SKETCH18_R)
        with Locations((-105.383522107, 131.35)):
            Circle(SKETCH18_R)
    extrude(amount=-CUT_EXTRUDE19_DEPTH, mode=Mode.SUBTRACT)

    # Sketch27 → Cut-Extrude20 (cut)
    with BuildSketch(Plane.XY.offset(66.81)):
        with Locations((11.083522107, 130.85)):
            Rectangle(SKETCH27_W, SKETCH27_H)
    extrude(amount=-CUT_EXTRUDE20_DEPTH, mode=Mode.SUBTRACT)

    # Sketch28 → Cut-Extrude21 (cut)
    with BuildSketch(Plane(origin=(0, 18.35, 0), x_dir=(1, 0, 0), z_dir=(0, 1, 0))):
        with Locations(Location((-77.883522107, -82.81, 0), (0, 0, 270))):
            Circle(SKETCH28_R)
        with Locations(Location((-57.883522107, -82.81, 0), (0, 0, 270))):
            Circle(SKETCH28_R)
        with Locations(Location((-37.883522107, -82.81, 0), (0, 0, 270))):
            Circle(SKETCH28_R)
        with Locations(Location((-17.883522107, -82.81, 0), (0, 0, 270))):
            Circle(SKETCH28_R)
        with Locations(Location((2.116477893, -82.81, 0), (0, 0, 270))):
            Circle(SKETCH28_R)
        with Locations(Location((22.116477893, -82.81, 0), (0, 0, 270))):
            Circle(SKETCH28_R)
    extrude(amount=-CUT_EXTRUDE21_DEPTH, mode=Mode.SUBTRACT)

    # Sketch29 → Boss-Extrude13 (add)
    with BuildSketch(Plane(origin=(0, 0, 61.81), x_dir=(-1, 0, 0), z_dir=(0, 0, -1))):
        with Locations((47.190948631, 83.35)):
            Rectangle(SKETCH29_W, SKETCH29_H)
    extrude(amount=BOSS_EXTRUDE13_DEPTH)

    # Sketch30 → Cut-Extrude22 (cut)
    with BuildSketch(Plane.ZY.offset(54.690948631)):
        with Locations((59.81, 83.35)):
            Rectangle(SKETCH30_W, SKETCH30_H)
    extrude(amount=-CUT_EXTRUDE22_DEPTH, mode=Mode.SUBTRACT)

    # Chamfer3
    chamfer3_edges = [part.edges().sort_by_distance(p)[0] for p in [
        (-47.190948631, 68.35, 61.81),
        (-47.190948631, 98.35, 61.81),
    ]]
    chamfer(chamfer3_edges, length=CHAMFER3_SIZE)


solid = part.part
